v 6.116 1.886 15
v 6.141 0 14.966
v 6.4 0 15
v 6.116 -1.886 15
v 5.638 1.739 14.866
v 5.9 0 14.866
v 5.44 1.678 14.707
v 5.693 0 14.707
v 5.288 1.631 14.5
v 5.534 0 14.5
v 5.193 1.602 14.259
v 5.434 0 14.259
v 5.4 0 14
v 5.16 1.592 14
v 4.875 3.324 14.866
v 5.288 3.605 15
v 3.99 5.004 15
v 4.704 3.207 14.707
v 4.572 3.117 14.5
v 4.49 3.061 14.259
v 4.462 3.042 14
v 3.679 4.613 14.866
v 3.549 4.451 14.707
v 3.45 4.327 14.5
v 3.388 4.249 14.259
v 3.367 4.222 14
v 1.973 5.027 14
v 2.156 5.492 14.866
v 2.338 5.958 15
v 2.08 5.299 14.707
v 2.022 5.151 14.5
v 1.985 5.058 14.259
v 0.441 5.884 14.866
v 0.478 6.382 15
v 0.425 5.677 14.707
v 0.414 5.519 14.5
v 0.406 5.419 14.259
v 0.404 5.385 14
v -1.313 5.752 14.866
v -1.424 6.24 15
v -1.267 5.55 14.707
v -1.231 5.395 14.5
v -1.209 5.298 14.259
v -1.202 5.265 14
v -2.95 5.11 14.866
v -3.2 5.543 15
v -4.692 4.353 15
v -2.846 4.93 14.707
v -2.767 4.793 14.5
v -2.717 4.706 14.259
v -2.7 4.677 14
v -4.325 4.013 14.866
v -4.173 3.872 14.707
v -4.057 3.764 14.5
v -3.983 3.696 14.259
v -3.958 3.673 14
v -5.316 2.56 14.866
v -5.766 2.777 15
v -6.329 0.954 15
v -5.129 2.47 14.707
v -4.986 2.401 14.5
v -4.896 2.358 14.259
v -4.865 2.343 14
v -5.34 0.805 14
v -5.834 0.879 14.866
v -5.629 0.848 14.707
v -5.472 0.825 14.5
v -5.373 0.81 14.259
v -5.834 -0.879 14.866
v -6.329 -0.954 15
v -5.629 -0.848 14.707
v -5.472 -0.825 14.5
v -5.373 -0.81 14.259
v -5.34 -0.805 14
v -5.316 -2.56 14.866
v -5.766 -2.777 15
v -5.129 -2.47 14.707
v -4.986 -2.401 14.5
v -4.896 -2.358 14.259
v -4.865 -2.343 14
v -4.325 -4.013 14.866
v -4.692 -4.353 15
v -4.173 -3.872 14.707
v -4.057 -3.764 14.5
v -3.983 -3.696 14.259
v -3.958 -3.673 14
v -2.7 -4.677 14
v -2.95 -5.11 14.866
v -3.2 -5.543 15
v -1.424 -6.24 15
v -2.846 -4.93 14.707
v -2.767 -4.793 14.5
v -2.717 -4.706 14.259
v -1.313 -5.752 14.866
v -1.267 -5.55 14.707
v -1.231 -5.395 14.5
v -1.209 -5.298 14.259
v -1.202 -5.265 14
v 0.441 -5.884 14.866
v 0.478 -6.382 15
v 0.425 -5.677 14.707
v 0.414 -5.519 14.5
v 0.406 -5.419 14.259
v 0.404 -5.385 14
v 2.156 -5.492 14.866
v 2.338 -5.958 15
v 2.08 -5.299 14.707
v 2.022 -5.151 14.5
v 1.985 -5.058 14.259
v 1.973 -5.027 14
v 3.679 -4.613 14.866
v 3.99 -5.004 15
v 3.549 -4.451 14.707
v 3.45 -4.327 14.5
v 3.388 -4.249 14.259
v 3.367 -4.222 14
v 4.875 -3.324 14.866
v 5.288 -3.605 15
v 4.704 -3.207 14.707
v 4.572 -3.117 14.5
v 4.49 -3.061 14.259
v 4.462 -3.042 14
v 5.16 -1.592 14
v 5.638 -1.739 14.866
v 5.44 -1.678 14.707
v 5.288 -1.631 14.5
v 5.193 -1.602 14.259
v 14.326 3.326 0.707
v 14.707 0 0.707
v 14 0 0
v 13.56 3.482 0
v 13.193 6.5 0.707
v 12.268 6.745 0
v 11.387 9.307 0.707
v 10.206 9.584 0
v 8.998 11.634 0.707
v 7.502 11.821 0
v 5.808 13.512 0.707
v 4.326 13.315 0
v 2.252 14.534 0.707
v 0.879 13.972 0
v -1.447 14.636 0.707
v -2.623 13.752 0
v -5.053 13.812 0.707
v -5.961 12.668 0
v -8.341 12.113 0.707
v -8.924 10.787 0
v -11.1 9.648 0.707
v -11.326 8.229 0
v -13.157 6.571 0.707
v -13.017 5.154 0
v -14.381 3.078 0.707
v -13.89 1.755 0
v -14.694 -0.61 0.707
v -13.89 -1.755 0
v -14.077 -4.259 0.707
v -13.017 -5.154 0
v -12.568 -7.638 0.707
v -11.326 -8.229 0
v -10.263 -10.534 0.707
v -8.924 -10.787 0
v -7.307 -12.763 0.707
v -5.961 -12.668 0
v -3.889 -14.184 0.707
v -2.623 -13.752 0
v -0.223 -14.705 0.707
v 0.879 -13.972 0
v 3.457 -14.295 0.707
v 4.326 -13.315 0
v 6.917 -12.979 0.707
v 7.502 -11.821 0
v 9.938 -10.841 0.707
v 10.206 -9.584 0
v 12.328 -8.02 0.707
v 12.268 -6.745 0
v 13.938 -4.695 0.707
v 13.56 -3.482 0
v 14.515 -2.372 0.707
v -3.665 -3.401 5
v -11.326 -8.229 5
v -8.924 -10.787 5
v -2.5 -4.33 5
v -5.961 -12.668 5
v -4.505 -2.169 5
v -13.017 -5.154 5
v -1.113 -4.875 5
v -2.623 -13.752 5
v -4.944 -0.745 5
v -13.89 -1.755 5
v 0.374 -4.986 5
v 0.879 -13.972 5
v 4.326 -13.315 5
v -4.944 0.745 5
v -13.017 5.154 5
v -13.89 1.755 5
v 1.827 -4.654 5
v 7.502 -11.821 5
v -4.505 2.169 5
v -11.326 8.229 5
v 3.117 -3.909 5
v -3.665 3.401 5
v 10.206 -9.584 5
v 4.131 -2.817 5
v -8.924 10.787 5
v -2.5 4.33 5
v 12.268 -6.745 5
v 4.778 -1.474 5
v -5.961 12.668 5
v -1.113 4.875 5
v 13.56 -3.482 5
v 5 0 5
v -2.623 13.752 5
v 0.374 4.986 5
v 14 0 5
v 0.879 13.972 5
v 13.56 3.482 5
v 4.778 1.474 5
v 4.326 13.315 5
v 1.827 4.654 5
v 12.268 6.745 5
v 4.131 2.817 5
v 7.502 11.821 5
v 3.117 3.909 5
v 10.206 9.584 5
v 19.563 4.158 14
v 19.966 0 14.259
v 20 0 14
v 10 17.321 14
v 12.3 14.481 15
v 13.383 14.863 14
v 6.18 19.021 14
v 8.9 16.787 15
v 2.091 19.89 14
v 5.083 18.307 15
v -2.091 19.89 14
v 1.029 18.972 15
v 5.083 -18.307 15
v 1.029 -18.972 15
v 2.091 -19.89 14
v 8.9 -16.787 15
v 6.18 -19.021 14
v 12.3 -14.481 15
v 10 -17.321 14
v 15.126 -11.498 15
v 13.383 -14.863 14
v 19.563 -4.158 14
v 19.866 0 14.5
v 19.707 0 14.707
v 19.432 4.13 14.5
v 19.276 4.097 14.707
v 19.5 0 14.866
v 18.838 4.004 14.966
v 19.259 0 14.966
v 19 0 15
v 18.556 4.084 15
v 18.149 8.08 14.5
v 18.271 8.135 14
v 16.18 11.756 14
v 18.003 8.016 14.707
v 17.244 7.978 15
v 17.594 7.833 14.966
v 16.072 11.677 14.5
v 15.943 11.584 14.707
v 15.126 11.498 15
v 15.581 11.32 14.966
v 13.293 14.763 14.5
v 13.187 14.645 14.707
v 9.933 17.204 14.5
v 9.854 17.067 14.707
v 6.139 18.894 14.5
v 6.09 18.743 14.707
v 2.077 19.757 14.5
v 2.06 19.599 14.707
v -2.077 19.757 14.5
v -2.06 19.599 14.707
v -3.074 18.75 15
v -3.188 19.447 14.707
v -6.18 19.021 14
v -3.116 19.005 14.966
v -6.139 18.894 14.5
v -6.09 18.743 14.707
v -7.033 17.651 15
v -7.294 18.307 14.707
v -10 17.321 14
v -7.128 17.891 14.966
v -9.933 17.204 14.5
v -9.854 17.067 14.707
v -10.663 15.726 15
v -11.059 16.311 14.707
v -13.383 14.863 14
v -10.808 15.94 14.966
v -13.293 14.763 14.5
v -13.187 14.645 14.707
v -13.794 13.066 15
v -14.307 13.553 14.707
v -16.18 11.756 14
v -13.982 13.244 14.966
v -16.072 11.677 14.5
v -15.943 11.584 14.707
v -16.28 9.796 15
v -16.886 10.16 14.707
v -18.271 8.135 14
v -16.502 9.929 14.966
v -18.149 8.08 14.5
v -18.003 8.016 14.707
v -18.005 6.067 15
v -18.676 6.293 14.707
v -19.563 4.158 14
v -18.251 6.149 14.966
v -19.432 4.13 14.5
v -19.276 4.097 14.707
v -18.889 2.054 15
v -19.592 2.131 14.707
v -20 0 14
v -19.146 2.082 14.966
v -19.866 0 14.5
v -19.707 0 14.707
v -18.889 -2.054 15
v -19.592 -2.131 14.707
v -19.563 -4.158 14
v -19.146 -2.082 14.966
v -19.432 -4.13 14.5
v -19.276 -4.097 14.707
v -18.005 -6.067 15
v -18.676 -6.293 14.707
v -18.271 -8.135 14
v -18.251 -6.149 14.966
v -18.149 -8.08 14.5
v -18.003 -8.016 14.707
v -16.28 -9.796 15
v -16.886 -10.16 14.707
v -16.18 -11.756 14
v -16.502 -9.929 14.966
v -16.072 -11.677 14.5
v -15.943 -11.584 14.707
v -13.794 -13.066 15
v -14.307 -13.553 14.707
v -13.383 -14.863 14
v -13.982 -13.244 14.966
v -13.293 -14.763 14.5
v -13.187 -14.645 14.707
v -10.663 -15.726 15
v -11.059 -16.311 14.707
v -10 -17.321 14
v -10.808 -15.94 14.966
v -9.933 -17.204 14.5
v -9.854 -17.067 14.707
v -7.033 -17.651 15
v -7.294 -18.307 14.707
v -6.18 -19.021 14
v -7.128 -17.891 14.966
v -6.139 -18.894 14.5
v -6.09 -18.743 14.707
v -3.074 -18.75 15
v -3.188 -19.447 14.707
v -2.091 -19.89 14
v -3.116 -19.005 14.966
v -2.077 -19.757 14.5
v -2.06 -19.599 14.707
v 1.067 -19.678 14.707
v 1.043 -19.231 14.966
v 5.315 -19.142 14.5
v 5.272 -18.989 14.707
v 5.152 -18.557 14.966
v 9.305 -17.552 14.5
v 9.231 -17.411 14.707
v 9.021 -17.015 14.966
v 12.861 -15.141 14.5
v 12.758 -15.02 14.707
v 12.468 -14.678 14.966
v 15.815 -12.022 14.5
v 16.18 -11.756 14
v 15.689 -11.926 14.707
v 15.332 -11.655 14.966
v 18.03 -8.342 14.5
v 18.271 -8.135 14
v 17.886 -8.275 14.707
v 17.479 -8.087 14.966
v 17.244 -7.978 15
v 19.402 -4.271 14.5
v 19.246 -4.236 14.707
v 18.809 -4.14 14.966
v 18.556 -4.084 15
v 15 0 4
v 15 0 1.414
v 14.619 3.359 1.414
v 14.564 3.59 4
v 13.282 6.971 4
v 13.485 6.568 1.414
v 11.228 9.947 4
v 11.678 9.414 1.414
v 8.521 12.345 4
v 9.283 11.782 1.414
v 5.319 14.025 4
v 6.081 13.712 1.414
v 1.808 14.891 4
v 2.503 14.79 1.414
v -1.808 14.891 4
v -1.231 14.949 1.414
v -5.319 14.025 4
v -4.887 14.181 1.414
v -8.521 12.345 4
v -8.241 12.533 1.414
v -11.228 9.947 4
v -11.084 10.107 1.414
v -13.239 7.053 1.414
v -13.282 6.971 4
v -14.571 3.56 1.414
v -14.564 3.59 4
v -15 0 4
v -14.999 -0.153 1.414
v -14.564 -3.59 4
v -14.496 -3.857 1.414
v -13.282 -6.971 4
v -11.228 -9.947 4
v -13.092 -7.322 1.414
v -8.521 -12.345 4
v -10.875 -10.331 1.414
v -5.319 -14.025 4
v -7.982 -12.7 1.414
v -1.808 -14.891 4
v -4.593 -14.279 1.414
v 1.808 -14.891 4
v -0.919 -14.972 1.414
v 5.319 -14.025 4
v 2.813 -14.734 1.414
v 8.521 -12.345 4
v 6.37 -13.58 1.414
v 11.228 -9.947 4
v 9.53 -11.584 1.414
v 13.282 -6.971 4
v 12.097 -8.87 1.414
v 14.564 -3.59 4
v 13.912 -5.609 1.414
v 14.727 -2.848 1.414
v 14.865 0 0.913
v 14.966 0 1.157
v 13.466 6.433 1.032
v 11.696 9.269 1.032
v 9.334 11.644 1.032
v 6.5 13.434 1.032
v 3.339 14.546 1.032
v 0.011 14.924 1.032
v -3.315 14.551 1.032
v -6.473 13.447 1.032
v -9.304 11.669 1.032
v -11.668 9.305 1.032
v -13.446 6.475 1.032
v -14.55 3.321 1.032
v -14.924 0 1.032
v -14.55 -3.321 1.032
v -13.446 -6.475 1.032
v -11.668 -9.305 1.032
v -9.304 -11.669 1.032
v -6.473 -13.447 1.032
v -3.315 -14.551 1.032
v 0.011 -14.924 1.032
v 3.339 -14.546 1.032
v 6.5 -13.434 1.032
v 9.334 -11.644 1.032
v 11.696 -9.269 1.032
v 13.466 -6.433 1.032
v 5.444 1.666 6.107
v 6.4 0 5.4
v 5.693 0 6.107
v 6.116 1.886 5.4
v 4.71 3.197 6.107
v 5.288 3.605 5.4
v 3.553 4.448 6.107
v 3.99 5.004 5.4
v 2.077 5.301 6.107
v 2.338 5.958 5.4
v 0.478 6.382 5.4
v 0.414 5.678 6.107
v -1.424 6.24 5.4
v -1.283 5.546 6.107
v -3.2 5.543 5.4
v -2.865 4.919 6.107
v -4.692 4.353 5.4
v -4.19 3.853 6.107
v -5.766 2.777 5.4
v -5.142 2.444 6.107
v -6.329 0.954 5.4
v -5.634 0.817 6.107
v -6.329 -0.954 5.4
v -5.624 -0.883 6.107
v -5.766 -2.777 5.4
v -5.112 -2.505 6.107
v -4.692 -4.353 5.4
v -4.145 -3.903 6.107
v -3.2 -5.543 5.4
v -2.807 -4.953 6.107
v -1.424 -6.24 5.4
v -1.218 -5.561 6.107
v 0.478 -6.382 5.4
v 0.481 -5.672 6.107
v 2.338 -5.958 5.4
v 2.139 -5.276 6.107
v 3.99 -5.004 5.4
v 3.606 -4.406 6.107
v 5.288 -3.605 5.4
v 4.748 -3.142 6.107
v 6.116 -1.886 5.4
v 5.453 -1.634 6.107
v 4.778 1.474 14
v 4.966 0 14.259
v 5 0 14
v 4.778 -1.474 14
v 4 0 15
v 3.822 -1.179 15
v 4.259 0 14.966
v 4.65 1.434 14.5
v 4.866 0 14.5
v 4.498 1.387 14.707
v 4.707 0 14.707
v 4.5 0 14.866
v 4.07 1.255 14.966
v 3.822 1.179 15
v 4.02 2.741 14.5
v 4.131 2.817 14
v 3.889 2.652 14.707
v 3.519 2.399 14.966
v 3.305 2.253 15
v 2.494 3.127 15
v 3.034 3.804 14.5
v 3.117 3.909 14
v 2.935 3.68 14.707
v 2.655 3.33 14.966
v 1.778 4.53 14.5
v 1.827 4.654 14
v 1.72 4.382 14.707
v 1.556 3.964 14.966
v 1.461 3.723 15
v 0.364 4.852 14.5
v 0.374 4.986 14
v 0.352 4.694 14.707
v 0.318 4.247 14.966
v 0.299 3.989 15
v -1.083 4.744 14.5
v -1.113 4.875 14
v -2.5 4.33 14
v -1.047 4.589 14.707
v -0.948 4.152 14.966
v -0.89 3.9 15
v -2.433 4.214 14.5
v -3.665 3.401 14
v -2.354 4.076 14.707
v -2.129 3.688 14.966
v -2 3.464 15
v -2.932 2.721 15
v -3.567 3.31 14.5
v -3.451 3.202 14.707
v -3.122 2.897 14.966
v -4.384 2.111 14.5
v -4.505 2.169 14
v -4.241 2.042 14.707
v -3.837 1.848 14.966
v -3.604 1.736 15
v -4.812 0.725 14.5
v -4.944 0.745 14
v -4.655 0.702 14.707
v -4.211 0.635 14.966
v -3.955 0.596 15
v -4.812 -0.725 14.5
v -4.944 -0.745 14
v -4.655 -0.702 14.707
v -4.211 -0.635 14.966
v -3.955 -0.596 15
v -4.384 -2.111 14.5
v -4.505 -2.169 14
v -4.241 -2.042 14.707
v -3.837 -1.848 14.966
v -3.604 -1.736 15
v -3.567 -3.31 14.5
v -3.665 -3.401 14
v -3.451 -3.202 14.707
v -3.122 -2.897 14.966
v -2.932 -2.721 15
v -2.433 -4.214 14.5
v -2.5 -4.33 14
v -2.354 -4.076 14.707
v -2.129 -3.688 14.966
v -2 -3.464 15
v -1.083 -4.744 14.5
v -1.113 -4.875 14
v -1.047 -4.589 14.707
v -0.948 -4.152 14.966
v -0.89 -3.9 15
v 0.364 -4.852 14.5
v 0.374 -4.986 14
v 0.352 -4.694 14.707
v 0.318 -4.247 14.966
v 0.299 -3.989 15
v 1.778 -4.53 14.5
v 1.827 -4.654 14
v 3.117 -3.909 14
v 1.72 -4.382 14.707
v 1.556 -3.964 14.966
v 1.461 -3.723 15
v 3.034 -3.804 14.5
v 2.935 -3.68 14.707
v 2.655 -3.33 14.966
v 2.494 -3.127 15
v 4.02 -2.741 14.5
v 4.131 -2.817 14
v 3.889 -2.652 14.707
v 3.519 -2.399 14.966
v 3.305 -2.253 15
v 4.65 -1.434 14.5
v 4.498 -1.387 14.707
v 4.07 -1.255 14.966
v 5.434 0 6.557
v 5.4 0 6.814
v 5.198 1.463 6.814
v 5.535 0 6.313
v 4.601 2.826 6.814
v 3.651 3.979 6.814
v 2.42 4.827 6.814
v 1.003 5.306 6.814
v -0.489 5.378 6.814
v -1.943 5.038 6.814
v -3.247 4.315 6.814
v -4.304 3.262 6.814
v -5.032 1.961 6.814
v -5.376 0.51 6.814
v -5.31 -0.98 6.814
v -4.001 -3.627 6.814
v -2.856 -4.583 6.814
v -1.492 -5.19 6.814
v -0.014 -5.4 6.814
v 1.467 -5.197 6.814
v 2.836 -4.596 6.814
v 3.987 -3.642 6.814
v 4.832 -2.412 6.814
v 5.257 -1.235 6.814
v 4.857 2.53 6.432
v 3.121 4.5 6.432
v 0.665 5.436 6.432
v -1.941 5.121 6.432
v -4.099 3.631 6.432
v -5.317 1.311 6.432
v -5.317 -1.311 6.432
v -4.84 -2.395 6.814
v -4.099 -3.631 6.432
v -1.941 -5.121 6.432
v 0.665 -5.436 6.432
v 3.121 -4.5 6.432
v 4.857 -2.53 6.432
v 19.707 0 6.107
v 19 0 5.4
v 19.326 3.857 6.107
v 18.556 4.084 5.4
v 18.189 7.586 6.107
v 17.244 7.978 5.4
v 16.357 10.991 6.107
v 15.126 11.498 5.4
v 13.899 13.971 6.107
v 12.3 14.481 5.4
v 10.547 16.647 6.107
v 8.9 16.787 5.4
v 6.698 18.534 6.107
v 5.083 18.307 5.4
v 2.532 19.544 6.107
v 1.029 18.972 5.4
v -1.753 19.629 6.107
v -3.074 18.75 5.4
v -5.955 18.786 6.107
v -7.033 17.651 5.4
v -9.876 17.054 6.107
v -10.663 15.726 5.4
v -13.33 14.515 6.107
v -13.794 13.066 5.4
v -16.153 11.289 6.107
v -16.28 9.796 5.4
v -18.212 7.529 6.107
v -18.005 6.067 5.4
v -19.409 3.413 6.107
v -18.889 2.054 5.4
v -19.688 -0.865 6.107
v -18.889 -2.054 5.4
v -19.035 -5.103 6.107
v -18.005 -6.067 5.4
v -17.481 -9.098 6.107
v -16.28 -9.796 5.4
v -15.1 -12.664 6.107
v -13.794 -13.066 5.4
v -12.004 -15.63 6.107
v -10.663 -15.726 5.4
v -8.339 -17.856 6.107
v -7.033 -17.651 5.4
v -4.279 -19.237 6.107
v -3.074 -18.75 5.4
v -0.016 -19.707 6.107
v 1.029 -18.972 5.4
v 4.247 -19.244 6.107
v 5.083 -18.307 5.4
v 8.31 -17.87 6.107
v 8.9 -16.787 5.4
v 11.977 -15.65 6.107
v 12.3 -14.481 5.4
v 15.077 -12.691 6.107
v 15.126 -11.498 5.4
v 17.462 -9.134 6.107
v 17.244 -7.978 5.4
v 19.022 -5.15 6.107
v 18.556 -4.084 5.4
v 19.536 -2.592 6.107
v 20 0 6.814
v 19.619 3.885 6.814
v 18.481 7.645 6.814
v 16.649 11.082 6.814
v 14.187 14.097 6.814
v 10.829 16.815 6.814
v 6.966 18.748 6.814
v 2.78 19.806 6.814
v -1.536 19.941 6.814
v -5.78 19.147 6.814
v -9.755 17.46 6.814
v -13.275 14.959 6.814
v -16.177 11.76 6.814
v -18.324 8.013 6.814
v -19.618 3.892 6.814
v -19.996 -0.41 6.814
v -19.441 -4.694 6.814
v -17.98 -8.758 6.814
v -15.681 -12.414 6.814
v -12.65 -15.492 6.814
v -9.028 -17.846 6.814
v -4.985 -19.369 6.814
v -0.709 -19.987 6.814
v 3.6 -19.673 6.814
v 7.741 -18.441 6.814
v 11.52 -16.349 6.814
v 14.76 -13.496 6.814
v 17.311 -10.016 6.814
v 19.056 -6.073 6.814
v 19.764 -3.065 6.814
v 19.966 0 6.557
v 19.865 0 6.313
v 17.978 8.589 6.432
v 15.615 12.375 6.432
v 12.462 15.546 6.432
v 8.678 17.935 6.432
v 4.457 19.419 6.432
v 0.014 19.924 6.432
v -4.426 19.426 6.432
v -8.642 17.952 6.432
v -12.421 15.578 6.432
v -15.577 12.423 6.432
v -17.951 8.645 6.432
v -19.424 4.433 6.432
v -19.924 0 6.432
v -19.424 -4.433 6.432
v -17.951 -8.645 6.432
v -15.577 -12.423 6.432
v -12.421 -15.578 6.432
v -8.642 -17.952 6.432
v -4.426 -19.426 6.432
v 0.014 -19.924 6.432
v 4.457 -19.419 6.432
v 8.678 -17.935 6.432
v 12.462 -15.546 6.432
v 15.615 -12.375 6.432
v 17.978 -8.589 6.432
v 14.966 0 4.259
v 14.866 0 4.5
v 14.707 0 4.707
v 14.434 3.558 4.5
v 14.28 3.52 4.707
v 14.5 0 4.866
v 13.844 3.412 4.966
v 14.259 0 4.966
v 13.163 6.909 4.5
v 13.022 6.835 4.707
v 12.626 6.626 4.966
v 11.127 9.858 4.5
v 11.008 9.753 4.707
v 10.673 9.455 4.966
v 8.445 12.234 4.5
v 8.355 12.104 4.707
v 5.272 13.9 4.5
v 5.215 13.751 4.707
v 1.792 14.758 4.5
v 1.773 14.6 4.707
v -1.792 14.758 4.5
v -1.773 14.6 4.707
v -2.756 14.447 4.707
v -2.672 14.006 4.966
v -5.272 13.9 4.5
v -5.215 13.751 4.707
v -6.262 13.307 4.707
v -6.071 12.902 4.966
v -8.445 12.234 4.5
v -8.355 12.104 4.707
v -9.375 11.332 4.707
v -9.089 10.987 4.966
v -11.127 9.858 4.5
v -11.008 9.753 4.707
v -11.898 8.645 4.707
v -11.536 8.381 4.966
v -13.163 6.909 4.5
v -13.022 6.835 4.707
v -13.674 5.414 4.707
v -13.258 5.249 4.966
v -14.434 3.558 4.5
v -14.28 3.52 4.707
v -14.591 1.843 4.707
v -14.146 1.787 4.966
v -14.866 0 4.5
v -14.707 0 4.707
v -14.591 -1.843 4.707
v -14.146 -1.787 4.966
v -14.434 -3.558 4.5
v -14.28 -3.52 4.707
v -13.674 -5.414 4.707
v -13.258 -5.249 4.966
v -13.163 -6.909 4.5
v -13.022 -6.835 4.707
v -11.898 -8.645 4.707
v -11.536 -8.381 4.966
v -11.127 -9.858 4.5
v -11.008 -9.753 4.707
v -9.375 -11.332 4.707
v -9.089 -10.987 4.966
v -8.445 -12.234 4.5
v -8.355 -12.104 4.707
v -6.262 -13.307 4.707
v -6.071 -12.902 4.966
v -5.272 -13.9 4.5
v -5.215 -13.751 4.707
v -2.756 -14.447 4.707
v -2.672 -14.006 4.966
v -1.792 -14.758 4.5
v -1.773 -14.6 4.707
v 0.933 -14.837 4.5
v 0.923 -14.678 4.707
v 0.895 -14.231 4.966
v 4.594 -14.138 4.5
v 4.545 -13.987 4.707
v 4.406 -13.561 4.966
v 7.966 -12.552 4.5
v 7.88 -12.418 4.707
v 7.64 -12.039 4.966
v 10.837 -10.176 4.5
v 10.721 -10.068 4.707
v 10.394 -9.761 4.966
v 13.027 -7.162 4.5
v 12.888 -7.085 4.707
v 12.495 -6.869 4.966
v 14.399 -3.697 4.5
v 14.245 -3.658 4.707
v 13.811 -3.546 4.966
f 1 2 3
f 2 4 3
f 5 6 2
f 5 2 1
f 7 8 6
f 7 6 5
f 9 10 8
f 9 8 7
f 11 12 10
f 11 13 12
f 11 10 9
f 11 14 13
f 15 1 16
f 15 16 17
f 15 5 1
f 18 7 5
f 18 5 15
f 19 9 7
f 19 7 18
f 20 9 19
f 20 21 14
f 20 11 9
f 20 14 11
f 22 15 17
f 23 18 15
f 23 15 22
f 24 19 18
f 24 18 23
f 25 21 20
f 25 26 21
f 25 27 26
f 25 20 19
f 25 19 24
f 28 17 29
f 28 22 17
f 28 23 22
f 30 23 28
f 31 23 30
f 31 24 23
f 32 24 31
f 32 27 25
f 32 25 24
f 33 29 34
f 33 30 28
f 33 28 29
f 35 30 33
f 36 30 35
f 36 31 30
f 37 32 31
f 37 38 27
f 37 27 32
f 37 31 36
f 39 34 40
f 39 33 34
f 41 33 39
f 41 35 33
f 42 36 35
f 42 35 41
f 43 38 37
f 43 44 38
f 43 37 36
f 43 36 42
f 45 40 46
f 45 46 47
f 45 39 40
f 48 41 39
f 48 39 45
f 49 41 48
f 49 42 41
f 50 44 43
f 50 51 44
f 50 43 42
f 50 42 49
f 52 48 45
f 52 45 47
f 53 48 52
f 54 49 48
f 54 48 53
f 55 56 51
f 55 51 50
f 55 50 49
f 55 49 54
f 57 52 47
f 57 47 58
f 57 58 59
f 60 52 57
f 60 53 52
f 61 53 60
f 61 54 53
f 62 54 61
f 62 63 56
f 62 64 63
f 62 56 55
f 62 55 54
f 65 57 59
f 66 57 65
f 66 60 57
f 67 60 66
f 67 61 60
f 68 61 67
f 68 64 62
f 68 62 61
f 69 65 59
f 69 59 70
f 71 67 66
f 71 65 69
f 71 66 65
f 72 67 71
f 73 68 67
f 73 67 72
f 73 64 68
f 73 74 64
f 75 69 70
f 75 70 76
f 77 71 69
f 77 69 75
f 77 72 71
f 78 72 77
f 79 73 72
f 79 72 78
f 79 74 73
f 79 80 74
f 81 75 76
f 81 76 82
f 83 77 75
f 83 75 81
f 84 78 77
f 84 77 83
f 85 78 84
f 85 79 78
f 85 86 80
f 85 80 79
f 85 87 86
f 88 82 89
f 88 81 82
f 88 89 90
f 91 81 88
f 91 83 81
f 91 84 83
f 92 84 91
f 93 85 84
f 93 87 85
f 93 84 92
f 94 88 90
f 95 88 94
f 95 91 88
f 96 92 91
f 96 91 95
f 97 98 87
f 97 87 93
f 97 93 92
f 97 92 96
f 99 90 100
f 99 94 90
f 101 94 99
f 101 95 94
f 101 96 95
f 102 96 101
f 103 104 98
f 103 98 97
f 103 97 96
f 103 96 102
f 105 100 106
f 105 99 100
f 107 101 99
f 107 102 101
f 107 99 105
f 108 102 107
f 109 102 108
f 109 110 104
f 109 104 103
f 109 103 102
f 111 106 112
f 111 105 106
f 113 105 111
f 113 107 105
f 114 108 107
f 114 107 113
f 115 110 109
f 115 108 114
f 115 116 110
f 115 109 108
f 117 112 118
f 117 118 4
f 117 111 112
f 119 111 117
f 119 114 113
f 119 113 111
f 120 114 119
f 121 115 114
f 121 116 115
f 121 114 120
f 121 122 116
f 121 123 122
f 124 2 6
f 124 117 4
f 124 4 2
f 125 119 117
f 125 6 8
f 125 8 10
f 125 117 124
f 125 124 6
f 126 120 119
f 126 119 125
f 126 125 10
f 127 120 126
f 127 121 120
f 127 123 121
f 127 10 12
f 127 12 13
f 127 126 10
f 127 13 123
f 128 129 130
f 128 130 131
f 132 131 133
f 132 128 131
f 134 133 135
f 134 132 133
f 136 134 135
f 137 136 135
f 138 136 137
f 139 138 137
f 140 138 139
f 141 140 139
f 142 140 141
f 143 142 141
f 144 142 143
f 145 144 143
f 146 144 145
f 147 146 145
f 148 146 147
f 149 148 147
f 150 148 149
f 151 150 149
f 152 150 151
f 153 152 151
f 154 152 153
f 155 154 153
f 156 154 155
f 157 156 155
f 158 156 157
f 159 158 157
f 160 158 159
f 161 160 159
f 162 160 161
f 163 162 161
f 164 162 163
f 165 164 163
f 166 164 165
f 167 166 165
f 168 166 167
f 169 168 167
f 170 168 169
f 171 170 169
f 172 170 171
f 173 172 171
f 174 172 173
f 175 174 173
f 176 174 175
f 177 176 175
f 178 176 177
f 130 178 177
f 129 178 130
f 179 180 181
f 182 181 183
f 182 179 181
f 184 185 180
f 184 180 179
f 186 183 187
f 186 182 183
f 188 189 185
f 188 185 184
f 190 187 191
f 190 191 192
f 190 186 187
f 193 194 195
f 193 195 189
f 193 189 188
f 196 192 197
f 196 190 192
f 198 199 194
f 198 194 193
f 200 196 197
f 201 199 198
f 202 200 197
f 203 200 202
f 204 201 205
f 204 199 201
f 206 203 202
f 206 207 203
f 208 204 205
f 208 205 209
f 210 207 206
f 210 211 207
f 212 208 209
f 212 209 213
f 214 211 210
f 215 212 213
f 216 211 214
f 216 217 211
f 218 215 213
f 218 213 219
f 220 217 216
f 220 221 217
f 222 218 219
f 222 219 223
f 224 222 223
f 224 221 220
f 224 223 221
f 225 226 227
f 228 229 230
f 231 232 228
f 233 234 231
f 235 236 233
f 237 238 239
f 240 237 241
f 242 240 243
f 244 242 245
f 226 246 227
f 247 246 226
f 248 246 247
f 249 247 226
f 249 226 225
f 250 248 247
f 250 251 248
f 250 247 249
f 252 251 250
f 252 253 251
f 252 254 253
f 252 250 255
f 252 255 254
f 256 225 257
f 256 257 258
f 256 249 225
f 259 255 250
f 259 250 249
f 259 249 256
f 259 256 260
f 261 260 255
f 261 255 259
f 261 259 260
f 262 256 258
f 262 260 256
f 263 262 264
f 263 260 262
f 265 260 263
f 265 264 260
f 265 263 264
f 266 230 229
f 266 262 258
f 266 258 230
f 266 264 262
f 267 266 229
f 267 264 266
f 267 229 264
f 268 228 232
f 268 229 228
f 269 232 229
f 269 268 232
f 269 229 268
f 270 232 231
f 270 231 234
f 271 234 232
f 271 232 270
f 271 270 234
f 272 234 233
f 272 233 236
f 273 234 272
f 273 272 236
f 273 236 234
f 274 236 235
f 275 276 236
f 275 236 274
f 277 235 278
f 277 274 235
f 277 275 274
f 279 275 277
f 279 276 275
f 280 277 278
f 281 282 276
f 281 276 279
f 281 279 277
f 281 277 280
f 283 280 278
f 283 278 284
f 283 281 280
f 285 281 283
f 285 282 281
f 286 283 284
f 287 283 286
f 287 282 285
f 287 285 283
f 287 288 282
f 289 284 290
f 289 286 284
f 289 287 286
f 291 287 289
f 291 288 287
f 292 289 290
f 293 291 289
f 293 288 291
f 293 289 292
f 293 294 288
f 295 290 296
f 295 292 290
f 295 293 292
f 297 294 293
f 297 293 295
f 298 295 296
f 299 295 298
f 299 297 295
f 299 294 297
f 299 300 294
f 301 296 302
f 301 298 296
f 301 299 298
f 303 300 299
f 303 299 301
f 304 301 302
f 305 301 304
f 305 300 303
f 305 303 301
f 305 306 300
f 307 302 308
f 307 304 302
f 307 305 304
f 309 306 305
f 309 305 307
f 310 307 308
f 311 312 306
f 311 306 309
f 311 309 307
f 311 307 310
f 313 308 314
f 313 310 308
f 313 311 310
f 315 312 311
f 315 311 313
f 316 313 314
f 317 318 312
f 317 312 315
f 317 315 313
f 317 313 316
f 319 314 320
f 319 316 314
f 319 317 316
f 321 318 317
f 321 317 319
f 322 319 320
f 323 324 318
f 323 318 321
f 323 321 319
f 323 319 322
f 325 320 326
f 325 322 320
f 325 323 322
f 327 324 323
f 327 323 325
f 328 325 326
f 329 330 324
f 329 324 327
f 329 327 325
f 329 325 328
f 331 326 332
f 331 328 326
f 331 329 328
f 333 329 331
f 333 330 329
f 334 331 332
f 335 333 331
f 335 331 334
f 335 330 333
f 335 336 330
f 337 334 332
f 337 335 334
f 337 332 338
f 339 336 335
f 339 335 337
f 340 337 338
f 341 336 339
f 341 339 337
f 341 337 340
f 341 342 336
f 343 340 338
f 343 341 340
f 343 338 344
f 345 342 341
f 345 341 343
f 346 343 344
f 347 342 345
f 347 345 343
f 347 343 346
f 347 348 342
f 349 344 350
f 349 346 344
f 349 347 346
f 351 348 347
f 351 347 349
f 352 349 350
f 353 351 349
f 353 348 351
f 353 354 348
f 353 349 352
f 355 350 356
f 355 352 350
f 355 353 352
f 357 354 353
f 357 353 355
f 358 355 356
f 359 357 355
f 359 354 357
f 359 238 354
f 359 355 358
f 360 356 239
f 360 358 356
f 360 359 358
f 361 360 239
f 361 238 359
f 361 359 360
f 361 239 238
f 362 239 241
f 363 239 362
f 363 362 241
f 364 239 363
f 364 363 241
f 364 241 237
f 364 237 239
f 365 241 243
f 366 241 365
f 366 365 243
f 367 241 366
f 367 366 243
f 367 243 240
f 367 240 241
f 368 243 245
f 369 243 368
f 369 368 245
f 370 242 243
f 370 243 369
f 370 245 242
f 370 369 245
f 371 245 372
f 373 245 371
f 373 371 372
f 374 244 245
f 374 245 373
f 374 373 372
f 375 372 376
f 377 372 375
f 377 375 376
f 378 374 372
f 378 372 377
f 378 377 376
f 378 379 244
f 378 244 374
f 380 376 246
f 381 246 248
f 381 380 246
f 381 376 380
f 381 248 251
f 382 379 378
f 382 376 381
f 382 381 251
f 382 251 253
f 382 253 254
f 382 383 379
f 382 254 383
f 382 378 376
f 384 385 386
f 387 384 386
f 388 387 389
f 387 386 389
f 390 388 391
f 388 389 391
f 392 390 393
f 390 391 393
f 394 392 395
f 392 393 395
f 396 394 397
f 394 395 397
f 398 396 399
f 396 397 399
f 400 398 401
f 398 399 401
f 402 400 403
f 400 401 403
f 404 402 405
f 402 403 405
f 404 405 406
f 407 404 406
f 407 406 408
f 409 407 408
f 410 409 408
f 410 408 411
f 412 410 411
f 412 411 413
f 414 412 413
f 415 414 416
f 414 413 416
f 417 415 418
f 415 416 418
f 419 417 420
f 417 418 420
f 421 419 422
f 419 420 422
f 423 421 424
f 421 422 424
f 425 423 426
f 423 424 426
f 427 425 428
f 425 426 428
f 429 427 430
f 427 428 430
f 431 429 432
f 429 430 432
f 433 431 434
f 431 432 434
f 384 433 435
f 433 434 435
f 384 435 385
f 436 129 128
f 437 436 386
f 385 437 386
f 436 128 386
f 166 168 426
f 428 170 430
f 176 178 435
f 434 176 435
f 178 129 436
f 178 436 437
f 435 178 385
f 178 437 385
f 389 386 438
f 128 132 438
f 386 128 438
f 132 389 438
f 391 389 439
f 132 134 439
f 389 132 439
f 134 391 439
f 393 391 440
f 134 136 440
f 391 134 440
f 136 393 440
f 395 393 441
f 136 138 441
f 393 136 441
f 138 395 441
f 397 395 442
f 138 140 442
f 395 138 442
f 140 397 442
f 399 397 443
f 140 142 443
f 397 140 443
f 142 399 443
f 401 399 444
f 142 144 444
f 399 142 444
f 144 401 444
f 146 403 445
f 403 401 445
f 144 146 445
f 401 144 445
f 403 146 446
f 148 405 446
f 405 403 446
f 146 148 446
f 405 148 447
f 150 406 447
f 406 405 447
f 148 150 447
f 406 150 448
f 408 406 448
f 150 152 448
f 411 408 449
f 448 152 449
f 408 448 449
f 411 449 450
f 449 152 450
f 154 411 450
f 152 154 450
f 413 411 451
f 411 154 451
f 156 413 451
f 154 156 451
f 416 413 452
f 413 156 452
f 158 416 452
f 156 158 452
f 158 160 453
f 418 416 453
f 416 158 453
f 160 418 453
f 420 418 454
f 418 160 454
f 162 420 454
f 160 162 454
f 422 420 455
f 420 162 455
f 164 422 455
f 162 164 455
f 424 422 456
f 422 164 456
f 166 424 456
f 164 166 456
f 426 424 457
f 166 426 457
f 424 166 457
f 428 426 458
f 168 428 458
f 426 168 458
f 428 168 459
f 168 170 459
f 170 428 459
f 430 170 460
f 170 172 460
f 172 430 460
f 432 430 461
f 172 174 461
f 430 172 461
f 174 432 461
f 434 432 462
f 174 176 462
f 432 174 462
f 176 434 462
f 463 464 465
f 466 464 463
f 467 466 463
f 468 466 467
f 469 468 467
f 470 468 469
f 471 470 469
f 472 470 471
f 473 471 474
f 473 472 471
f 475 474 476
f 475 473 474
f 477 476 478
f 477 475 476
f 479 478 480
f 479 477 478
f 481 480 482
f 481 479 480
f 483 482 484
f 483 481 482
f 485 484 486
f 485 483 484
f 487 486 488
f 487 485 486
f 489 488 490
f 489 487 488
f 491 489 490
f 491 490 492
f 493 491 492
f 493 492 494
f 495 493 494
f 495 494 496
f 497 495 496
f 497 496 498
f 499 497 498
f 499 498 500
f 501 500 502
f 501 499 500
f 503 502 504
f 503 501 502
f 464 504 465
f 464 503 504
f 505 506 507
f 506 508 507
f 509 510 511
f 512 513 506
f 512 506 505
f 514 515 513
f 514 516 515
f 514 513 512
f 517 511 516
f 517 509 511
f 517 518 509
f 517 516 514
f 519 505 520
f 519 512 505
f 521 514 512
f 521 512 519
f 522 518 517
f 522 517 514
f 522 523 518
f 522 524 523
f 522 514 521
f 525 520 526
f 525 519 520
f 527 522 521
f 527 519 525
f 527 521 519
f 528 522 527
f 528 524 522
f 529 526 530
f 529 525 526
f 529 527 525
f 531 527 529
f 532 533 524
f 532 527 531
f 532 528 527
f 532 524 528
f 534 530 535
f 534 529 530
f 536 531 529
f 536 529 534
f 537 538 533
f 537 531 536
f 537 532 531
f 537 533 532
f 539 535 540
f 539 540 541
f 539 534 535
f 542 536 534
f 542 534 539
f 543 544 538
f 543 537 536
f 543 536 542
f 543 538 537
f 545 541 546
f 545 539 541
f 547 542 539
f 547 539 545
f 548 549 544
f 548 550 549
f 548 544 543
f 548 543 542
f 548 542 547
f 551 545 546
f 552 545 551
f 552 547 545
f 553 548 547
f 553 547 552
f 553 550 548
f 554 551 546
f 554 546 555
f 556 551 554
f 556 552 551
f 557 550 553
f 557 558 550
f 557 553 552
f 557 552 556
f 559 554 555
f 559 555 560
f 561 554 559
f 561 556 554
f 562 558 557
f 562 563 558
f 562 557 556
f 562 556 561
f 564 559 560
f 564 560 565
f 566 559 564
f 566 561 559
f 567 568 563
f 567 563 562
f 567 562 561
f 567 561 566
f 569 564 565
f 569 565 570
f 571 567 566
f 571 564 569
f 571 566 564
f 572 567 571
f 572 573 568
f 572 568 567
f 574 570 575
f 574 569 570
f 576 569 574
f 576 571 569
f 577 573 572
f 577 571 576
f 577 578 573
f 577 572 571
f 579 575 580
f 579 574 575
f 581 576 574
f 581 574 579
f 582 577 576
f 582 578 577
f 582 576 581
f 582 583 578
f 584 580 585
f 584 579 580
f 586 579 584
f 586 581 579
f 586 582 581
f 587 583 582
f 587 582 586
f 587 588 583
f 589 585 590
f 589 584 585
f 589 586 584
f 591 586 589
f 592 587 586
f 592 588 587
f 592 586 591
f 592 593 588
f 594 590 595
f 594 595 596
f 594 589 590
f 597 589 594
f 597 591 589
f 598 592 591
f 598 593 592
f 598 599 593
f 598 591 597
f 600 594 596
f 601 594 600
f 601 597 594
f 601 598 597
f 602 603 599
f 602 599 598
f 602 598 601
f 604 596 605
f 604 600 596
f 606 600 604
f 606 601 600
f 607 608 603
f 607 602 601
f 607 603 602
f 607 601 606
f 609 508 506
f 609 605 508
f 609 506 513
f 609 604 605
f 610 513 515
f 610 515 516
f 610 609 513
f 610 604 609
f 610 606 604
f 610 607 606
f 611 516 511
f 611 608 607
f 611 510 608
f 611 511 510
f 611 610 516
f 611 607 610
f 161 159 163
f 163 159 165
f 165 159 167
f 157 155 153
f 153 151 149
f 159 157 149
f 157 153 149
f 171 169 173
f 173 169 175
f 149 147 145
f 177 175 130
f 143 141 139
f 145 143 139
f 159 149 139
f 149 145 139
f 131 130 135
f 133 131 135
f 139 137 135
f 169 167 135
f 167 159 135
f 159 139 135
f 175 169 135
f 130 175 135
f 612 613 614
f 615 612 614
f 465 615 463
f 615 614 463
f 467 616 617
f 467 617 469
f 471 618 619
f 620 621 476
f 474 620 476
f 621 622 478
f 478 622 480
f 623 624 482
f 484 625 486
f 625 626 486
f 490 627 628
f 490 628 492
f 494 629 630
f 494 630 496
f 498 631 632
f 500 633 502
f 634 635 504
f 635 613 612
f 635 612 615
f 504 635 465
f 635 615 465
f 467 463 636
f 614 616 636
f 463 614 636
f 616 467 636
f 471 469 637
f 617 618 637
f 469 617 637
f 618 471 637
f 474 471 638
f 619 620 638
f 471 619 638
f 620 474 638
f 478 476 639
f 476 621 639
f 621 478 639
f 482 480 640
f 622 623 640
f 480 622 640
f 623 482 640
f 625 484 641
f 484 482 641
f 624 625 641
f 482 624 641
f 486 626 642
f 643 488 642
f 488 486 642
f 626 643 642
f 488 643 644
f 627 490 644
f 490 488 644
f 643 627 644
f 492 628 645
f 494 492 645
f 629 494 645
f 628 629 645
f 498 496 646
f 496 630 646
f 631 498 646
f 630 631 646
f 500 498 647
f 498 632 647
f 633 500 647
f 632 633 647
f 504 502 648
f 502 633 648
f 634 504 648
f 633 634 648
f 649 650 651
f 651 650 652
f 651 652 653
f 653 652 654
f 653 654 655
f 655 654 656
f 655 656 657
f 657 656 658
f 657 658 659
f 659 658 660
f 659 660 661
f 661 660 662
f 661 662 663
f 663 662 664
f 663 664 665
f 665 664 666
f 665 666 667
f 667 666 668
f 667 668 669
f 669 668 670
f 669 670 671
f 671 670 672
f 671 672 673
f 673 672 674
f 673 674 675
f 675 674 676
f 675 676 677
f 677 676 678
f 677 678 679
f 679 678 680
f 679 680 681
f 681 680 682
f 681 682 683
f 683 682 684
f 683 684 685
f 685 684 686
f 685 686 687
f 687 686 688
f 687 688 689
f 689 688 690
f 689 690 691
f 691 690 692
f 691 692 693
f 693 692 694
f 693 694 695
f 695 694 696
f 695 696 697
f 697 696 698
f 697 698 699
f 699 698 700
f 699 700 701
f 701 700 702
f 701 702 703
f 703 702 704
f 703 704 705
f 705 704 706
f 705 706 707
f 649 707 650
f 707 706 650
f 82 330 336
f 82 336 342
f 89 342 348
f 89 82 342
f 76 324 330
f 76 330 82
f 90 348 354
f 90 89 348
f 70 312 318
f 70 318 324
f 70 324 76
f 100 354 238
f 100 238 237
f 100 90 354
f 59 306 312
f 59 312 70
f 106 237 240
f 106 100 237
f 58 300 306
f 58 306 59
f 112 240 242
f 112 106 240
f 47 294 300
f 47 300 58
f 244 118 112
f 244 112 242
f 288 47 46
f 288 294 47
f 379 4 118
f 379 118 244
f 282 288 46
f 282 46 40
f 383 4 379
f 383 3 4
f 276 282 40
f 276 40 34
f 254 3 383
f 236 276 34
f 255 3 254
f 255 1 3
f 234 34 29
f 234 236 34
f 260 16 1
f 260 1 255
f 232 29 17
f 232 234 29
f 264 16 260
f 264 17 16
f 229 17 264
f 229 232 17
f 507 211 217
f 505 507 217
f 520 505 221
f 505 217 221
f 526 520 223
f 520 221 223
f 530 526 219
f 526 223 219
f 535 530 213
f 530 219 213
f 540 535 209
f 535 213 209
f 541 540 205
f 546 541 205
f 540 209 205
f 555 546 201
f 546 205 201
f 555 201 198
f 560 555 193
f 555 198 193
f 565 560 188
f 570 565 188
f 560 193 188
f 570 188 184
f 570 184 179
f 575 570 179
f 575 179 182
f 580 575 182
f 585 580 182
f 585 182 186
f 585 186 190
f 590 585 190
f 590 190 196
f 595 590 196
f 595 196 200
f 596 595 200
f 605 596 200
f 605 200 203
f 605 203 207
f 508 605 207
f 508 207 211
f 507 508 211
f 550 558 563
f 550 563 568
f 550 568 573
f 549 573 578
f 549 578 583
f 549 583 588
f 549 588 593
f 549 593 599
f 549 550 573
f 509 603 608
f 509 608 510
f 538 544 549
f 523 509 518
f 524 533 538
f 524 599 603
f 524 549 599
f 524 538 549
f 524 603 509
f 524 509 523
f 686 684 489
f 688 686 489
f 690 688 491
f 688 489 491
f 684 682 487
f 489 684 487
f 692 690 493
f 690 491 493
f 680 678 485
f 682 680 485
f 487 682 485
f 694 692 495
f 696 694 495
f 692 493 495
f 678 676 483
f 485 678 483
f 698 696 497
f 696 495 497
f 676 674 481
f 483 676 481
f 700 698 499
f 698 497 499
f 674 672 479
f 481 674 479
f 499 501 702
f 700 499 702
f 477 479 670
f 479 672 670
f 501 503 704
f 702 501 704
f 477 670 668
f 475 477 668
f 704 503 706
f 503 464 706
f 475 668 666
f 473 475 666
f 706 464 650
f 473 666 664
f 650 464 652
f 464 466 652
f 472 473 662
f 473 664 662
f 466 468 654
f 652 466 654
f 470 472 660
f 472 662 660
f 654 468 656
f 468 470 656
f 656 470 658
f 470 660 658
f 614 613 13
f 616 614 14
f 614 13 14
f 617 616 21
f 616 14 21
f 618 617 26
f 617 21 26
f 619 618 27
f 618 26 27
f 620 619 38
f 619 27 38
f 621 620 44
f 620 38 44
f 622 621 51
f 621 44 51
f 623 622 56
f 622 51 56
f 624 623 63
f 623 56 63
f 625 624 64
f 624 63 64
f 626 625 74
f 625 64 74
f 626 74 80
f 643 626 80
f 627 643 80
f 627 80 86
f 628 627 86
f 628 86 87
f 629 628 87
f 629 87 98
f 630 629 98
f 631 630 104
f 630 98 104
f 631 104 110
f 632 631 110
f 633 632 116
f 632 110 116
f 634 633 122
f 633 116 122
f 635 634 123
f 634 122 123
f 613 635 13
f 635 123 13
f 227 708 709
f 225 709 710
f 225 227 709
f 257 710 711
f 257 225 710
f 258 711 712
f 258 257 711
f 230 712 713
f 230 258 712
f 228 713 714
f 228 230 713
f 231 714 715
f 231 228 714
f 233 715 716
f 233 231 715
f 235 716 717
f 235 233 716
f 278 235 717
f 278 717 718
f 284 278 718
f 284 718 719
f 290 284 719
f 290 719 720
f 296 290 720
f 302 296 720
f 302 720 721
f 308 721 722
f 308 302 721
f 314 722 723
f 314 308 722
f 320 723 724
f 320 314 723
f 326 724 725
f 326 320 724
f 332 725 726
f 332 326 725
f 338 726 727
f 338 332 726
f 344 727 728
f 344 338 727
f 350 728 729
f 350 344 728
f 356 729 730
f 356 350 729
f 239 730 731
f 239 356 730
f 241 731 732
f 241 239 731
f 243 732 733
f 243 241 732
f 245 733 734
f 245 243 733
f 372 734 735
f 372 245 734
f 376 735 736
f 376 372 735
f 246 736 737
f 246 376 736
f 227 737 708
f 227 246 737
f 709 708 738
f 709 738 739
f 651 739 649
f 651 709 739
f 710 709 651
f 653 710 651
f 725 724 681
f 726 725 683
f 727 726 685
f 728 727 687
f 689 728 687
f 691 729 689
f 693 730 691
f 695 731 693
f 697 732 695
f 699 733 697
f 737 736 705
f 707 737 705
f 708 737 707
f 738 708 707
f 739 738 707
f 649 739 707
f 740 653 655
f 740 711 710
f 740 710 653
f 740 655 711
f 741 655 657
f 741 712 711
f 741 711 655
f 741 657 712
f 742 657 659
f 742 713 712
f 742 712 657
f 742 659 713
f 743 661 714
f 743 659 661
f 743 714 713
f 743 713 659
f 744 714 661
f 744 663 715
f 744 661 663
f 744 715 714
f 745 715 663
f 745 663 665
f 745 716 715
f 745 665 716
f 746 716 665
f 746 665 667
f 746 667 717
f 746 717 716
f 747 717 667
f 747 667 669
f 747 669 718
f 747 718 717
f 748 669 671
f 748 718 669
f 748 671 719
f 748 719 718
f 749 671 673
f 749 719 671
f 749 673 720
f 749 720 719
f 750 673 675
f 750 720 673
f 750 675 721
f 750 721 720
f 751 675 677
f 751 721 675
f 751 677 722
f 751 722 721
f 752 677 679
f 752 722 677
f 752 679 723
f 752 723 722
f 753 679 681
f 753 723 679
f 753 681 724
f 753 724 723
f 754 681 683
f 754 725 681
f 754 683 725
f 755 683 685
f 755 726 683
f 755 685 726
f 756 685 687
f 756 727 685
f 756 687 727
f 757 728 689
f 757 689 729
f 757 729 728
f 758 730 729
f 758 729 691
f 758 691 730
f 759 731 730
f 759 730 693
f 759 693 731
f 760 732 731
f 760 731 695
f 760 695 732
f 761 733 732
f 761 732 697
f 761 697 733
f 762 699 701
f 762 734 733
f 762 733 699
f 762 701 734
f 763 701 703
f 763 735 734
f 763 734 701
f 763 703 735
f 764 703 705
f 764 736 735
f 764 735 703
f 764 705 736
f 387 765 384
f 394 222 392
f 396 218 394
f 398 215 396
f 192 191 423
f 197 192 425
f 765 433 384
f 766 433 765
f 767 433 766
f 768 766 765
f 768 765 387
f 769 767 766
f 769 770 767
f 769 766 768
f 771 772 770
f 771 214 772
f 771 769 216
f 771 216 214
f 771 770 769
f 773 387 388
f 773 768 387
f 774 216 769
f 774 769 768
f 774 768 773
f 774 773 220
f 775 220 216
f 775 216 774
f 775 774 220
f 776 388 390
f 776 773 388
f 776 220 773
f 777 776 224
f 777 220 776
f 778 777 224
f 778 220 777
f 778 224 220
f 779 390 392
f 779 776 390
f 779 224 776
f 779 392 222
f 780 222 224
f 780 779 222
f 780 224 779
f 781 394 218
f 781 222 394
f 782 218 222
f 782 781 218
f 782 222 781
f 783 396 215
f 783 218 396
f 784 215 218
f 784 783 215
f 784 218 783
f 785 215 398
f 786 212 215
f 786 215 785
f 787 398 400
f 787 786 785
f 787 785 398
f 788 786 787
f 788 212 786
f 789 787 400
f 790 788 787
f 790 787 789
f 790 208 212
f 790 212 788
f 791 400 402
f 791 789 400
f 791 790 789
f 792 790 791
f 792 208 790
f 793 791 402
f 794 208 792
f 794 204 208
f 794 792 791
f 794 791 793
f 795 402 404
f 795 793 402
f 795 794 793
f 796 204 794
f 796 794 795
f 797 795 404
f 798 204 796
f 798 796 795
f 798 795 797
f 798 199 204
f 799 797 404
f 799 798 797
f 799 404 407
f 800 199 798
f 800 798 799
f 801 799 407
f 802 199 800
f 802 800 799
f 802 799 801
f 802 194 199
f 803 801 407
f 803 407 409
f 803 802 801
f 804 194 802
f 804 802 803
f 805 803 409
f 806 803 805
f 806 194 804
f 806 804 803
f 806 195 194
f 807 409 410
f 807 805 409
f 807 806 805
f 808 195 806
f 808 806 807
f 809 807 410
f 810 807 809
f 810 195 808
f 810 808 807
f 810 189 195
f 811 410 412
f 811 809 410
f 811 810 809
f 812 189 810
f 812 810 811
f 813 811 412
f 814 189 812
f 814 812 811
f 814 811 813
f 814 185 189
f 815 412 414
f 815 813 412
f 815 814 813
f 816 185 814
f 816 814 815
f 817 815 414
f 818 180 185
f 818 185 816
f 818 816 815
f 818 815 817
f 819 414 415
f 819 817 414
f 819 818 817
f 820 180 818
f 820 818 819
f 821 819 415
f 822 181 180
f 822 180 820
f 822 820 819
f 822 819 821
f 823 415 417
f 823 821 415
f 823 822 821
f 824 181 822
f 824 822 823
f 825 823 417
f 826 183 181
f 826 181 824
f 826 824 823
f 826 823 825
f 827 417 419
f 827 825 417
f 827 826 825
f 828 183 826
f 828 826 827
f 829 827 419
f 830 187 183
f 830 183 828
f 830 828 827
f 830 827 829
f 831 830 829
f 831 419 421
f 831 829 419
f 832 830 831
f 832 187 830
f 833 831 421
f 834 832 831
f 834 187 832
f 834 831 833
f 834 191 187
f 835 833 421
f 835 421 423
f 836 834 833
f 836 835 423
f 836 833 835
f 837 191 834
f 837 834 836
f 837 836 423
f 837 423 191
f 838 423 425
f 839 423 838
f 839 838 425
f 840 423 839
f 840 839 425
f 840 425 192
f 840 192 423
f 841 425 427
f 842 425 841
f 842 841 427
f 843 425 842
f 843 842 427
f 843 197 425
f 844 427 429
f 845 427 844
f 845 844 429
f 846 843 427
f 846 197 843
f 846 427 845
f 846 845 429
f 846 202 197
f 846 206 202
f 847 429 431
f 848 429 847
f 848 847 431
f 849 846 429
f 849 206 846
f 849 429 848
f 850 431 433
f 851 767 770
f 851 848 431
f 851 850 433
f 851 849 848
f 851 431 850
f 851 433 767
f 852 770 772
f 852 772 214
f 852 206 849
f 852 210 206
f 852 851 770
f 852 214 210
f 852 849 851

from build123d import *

# Parameters (mm, degrees)
F1_R     = 15
F1_R_2   = 5
F2_DEPTH = 5
F3_DEPTH = 15
F4_R     = 20
F4_R_2   = 5.4
F5_DEPTH = 9.6
F6_SIZE  = 1
F7_R     = 1
F8_SIZE  = 1
F9_R     = 1


with BuildPart() as f2:
    # F1 (on Top) → F2 (new body)
    with BuildSketch(Plane.XY):
        Circle(F1_R)
        Circle(F1_R_2, mode=Mode.SUBTRACT)
        Circle(F1_R_2)
    extrude(amount=F2_DEPTH)

    # F1 (on Top) → F3 (join)
    with BuildSketch(Plane.XY):
        Circle(F1_R_2)
    extrude(amount=F3_DEPTH)

    # F8
    f8_edges = [f2.edges().sort_by_distance(p)[0] for p in [
        (-15, 0, 0),
    ]]
    chamfer(f8_edges, length=F8_SIZE)

    # F9
    f9_edges = [f2.edges().sort_by_distance(p)[0] for p in [
        (15, 0, 3),
        (-15, 0, 1),
        (-15, 0, 5),
        (-5, 0, 15),
    ]]
    fillet(f9_edges, radius=F9_R)


with BuildPart() as f5:
    # F4 (on face) → F5 (new body)
    with BuildSketch(Plane.XY.offset(15)):
        Circle(F4_R)
        Circle(F4_R_2, mode=Mode.SUBTRACT)
    extrude(amount=-F5_DEPTH)

    # F6
    f6_edges = [f5.edges().sort_by_distance(p)[0] for p in [
        (-20, 0, 5.4),
        (-5.4, 0, 5.4),
    ]]
    chamfer(f6_edges, length=F6_SIZE)

    # F7
    f7_edges = [f5.edges().sort_by_distance(p)[0] for p in [
        (20, 0, 10.7),
        (-20, 0, 6.4),
        (-20, 0, 15),
        (5.4, 0, 10.7),
        (-5.4, 0, 6.4),
        (-5.4, 0, 15),
    ]]
    fillet(f7_edges, radius=F7_R)


solid = Compound([f2.part, f5.part])
